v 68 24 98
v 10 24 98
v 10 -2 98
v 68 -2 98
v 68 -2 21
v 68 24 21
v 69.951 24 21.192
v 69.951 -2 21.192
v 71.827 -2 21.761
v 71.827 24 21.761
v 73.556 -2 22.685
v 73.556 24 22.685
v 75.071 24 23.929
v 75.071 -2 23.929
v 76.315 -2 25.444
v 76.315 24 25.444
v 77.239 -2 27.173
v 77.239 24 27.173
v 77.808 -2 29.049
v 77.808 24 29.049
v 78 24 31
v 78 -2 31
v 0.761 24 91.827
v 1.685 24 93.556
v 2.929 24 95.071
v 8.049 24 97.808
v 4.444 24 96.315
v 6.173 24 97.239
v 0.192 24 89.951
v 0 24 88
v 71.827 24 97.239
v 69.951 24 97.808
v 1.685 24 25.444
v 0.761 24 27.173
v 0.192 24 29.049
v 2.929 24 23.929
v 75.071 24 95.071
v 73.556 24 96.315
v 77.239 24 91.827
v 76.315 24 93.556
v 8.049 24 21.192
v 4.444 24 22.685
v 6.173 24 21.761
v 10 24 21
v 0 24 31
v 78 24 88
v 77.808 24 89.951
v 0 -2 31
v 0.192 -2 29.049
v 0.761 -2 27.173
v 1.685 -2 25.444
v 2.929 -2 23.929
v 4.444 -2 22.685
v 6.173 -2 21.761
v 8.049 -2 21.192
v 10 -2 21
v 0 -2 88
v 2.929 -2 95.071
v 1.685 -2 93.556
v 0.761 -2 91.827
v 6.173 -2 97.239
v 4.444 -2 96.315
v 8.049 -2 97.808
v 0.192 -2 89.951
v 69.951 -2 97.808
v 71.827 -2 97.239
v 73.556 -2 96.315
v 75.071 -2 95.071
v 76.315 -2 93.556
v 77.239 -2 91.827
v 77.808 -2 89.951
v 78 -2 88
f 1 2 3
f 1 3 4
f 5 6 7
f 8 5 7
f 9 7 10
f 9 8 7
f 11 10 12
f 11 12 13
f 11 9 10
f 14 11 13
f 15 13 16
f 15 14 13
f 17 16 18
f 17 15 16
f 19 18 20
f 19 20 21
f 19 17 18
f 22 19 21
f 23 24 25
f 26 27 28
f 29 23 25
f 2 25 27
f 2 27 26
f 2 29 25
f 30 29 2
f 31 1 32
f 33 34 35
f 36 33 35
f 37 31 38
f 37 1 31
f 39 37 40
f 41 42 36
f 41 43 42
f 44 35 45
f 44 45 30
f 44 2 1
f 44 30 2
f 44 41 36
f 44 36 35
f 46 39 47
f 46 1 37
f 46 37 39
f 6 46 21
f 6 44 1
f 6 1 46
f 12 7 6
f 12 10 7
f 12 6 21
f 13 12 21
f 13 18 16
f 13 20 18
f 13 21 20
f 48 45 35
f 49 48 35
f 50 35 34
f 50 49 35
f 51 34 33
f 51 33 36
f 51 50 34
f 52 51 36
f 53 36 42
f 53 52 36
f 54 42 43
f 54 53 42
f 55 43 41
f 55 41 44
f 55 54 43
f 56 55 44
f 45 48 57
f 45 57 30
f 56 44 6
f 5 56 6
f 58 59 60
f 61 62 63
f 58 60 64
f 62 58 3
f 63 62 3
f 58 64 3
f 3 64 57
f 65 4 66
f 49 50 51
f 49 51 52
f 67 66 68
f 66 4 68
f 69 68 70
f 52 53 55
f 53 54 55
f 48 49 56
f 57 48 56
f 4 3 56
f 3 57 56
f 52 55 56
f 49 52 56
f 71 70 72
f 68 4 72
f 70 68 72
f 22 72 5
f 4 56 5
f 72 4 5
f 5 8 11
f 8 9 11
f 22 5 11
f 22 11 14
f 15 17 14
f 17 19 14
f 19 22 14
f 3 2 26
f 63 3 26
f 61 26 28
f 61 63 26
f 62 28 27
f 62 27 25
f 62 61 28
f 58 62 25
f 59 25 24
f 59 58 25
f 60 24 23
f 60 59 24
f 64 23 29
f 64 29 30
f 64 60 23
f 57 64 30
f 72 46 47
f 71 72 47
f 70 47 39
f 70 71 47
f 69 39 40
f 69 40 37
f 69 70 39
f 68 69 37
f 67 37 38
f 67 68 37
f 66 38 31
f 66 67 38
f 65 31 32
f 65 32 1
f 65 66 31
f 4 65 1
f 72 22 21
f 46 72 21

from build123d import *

# Parameters (mm, degrees)
CYLINDER005_W          = 10
CYLINDER005_H          = 26
CYLINDER005_ANGLE      = 90
BOX003_W               = 10
BOX003_H               = 26
BOX003_DEPTH           = 10
CUT002_PLACEMENT_ANGLE = 90
CYLINDER006_W          = 10
CYLINDER006_H          = 26
CYLINDER006_ANGLE      = 90
BOX004_W               = 10
BOX004_H               = 26
BOX004_DEPTH           = 10
CUT003_PLACEMENT_ANGLE = 180
CYLINDER007_W          = 10
CYLINDER007_H          = 26
CYLINDER007_ANGLE      = 90
BOX005_W               = 10
BOX005_H               = 26
BOX005_DEPTH           = 10
CUT004_PLACEMENT_ANGLE = 90
CYLINDER004_W          = 10
CYLINDER004_H          = 26
CYLINDER004_ANGLE      = 90
BOX002_W               = 10
BOX002_H               = 26
BOX002_DEPTH           = 10
BOX001_W               = 78
BOX001_H               = 26
BOX001_DEPTH           = 77


with BuildPart() as cylinder005:
    # Cylinder005 → Cylinder005 (revolve)
    with BuildSketch(Plane(origin=(0, 26, 0), x_dir=(1, 0, 0), z_dir=(0, 0, -1))):
        with Locations((5, 13)):
            Rectangle(CYLINDER005_W, CYLINDER005_H)
    revolve(axis=Axis((0, 26, 0), (0, -1, 0)), revolution_arc=CYLINDER005_ANGLE)


with BuildPart() as cut002:
    # Box003 → Box003 (new body)
    with BuildSketch(Plane.XY):
        with Locations((5, 13)):
            Rectangle(BOX003_W, BOX003_H)
    extrude(amount=BOX003_DEPTH)

    # Cut002: cut Cylinder005
    add(cylinder005.part, mode=Mode.SUBTRACT)


with BuildPart() as cut002_1:
    # Cut002 placement: moved
    add(cut002.part.moved(Location((68, 0, 10))).rotate(Axis((68, 0, 10), (0, 1, 0)), CUT002_PLACEMENT_ANGLE))


with BuildPart() as cylinder006:
    # Cylinder006 → Cylinder006 (revolve)
    with BuildSketch(Plane(origin=(0, 26, 0), x_dir=(1, 0, 0), z_dir=(0, 0, -1))):
        with Locations((5, 13)):
            Rectangle(CYLINDER006_W, CYLINDER006_H)
    revolve(axis=Axis((0, 26, 0), (0, -1, 0)), revolution_arc=CYLINDER006_ANGLE)


with BuildPart() as cut003:
    # Box004 → Box004 (new body)
    with BuildSketch(Plane.XY):
        with Locations((5, 13)):
            Rectangle(BOX004_W, BOX004_H)
    extrude(amount=BOX004_DEPTH)

    # Cut003: cut Cylinder006
    add(cylinder006.part, mode=Mode.SUBTRACT)


with BuildPart() as cut003_1:
    # Cut003 placement: moved
    add(cut003.part.moved(Location((10, 0, 10))).rotate(Axis((10, 0, 10), (0, 1, 0)), CUT003_PLACEMENT_ANGLE))


with BuildPart() as cylinder007:
    # Cylinder007 → Cylinder007 (revolve)
    with BuildSketch(Plane(origin=(0, 26, 0), x_dir=(1, 0, 0), z_dir=(0, 0, -1))):
        with Locations((5, 13)):
            Rectangle(CYLINDER007_W, CYLINDER007_H)
    revolve(axis=Axis((0, 26, 0), (0, -1, 0)), revolution_arc=CYLINDER007_ANGLE)


with BuildPart() as cut004:
    # Box005 → Box005 (new body)
    with BuildSketch(Plane.XY):
        with Locations((5, 13)):
            Rectangle(BOX005_W, BOX005_H)
    extrude(amount=BOX005_DEPTH)

    # Cut004: cut Cylinder007
    add(cylinder007.part, mode=Mode.SUBTRACT)


with BuildPart() as cut004_1:
    # Cut004 placement: moved
    add(cut004.part.moved(Location((10, 0, 67))).rotate(Axis((10, 0, 67), (0, -1, 0)), CUT004_PLACEMENT_ANGLE))


with BuildPart() as cylinder004:
    # Cylinder004 → Cylinder004 (revolve)
    with BuildSketch(Plane(origin=(0, 26, 0), x_dir=(1, 0, 0), z_dir=(0, 0, -1))):
        with Locations((5, 13)):
            Rectangle(CYLINDER004_W, CYLINDER004_H)
    revolve(axis=Axis((0, 26, 0), (0, -1, 0)), revolution_arc=CYLINDER004_ANGLE)


with BuildPart() as v25cuts:
    # Box002 → Box002 (new body)
    with BuildSketch(Plane.XY):
        with Locations((5, 13)):
            Rectangle(BOX002_W, BOX002_H)
    extrude(amount=BOX002_DEPTH)

    # Cut001: cut Cylinder004
    add(cylinder004.part, mode=Mode.SUBTRACT)


with BuildPart() as v25cuts_1:
    # Cut001 placement: moved
    add(v25cuts.part.moved(Location((68, 0, 67))))

    # Fusion004: union Cut002, Cut003, Cut004
    add(cut002_1.part)
    add(cut003_1.part)
    add(cut004_1.part)


with BuildPart() as v25b001:
    # Box001 → Box001 (new body)
    with BuildSketch(Plane.XY):
        with Locations((39, 13)):
            Rectangle(BOX001_W, BOX001_H)
    extrude(amount=BOX001_DEPTH)

    # Cut005: cut v25Cuts
    add(v25cuts_1.part, mode=Mode.SUBTRACT)


with BuildPart() as v25b001_1:
    # Cut005 placement: moved
    add(v25b001.part.moved(Location((0, -2, 21))))


solid = v25b001_1.part
